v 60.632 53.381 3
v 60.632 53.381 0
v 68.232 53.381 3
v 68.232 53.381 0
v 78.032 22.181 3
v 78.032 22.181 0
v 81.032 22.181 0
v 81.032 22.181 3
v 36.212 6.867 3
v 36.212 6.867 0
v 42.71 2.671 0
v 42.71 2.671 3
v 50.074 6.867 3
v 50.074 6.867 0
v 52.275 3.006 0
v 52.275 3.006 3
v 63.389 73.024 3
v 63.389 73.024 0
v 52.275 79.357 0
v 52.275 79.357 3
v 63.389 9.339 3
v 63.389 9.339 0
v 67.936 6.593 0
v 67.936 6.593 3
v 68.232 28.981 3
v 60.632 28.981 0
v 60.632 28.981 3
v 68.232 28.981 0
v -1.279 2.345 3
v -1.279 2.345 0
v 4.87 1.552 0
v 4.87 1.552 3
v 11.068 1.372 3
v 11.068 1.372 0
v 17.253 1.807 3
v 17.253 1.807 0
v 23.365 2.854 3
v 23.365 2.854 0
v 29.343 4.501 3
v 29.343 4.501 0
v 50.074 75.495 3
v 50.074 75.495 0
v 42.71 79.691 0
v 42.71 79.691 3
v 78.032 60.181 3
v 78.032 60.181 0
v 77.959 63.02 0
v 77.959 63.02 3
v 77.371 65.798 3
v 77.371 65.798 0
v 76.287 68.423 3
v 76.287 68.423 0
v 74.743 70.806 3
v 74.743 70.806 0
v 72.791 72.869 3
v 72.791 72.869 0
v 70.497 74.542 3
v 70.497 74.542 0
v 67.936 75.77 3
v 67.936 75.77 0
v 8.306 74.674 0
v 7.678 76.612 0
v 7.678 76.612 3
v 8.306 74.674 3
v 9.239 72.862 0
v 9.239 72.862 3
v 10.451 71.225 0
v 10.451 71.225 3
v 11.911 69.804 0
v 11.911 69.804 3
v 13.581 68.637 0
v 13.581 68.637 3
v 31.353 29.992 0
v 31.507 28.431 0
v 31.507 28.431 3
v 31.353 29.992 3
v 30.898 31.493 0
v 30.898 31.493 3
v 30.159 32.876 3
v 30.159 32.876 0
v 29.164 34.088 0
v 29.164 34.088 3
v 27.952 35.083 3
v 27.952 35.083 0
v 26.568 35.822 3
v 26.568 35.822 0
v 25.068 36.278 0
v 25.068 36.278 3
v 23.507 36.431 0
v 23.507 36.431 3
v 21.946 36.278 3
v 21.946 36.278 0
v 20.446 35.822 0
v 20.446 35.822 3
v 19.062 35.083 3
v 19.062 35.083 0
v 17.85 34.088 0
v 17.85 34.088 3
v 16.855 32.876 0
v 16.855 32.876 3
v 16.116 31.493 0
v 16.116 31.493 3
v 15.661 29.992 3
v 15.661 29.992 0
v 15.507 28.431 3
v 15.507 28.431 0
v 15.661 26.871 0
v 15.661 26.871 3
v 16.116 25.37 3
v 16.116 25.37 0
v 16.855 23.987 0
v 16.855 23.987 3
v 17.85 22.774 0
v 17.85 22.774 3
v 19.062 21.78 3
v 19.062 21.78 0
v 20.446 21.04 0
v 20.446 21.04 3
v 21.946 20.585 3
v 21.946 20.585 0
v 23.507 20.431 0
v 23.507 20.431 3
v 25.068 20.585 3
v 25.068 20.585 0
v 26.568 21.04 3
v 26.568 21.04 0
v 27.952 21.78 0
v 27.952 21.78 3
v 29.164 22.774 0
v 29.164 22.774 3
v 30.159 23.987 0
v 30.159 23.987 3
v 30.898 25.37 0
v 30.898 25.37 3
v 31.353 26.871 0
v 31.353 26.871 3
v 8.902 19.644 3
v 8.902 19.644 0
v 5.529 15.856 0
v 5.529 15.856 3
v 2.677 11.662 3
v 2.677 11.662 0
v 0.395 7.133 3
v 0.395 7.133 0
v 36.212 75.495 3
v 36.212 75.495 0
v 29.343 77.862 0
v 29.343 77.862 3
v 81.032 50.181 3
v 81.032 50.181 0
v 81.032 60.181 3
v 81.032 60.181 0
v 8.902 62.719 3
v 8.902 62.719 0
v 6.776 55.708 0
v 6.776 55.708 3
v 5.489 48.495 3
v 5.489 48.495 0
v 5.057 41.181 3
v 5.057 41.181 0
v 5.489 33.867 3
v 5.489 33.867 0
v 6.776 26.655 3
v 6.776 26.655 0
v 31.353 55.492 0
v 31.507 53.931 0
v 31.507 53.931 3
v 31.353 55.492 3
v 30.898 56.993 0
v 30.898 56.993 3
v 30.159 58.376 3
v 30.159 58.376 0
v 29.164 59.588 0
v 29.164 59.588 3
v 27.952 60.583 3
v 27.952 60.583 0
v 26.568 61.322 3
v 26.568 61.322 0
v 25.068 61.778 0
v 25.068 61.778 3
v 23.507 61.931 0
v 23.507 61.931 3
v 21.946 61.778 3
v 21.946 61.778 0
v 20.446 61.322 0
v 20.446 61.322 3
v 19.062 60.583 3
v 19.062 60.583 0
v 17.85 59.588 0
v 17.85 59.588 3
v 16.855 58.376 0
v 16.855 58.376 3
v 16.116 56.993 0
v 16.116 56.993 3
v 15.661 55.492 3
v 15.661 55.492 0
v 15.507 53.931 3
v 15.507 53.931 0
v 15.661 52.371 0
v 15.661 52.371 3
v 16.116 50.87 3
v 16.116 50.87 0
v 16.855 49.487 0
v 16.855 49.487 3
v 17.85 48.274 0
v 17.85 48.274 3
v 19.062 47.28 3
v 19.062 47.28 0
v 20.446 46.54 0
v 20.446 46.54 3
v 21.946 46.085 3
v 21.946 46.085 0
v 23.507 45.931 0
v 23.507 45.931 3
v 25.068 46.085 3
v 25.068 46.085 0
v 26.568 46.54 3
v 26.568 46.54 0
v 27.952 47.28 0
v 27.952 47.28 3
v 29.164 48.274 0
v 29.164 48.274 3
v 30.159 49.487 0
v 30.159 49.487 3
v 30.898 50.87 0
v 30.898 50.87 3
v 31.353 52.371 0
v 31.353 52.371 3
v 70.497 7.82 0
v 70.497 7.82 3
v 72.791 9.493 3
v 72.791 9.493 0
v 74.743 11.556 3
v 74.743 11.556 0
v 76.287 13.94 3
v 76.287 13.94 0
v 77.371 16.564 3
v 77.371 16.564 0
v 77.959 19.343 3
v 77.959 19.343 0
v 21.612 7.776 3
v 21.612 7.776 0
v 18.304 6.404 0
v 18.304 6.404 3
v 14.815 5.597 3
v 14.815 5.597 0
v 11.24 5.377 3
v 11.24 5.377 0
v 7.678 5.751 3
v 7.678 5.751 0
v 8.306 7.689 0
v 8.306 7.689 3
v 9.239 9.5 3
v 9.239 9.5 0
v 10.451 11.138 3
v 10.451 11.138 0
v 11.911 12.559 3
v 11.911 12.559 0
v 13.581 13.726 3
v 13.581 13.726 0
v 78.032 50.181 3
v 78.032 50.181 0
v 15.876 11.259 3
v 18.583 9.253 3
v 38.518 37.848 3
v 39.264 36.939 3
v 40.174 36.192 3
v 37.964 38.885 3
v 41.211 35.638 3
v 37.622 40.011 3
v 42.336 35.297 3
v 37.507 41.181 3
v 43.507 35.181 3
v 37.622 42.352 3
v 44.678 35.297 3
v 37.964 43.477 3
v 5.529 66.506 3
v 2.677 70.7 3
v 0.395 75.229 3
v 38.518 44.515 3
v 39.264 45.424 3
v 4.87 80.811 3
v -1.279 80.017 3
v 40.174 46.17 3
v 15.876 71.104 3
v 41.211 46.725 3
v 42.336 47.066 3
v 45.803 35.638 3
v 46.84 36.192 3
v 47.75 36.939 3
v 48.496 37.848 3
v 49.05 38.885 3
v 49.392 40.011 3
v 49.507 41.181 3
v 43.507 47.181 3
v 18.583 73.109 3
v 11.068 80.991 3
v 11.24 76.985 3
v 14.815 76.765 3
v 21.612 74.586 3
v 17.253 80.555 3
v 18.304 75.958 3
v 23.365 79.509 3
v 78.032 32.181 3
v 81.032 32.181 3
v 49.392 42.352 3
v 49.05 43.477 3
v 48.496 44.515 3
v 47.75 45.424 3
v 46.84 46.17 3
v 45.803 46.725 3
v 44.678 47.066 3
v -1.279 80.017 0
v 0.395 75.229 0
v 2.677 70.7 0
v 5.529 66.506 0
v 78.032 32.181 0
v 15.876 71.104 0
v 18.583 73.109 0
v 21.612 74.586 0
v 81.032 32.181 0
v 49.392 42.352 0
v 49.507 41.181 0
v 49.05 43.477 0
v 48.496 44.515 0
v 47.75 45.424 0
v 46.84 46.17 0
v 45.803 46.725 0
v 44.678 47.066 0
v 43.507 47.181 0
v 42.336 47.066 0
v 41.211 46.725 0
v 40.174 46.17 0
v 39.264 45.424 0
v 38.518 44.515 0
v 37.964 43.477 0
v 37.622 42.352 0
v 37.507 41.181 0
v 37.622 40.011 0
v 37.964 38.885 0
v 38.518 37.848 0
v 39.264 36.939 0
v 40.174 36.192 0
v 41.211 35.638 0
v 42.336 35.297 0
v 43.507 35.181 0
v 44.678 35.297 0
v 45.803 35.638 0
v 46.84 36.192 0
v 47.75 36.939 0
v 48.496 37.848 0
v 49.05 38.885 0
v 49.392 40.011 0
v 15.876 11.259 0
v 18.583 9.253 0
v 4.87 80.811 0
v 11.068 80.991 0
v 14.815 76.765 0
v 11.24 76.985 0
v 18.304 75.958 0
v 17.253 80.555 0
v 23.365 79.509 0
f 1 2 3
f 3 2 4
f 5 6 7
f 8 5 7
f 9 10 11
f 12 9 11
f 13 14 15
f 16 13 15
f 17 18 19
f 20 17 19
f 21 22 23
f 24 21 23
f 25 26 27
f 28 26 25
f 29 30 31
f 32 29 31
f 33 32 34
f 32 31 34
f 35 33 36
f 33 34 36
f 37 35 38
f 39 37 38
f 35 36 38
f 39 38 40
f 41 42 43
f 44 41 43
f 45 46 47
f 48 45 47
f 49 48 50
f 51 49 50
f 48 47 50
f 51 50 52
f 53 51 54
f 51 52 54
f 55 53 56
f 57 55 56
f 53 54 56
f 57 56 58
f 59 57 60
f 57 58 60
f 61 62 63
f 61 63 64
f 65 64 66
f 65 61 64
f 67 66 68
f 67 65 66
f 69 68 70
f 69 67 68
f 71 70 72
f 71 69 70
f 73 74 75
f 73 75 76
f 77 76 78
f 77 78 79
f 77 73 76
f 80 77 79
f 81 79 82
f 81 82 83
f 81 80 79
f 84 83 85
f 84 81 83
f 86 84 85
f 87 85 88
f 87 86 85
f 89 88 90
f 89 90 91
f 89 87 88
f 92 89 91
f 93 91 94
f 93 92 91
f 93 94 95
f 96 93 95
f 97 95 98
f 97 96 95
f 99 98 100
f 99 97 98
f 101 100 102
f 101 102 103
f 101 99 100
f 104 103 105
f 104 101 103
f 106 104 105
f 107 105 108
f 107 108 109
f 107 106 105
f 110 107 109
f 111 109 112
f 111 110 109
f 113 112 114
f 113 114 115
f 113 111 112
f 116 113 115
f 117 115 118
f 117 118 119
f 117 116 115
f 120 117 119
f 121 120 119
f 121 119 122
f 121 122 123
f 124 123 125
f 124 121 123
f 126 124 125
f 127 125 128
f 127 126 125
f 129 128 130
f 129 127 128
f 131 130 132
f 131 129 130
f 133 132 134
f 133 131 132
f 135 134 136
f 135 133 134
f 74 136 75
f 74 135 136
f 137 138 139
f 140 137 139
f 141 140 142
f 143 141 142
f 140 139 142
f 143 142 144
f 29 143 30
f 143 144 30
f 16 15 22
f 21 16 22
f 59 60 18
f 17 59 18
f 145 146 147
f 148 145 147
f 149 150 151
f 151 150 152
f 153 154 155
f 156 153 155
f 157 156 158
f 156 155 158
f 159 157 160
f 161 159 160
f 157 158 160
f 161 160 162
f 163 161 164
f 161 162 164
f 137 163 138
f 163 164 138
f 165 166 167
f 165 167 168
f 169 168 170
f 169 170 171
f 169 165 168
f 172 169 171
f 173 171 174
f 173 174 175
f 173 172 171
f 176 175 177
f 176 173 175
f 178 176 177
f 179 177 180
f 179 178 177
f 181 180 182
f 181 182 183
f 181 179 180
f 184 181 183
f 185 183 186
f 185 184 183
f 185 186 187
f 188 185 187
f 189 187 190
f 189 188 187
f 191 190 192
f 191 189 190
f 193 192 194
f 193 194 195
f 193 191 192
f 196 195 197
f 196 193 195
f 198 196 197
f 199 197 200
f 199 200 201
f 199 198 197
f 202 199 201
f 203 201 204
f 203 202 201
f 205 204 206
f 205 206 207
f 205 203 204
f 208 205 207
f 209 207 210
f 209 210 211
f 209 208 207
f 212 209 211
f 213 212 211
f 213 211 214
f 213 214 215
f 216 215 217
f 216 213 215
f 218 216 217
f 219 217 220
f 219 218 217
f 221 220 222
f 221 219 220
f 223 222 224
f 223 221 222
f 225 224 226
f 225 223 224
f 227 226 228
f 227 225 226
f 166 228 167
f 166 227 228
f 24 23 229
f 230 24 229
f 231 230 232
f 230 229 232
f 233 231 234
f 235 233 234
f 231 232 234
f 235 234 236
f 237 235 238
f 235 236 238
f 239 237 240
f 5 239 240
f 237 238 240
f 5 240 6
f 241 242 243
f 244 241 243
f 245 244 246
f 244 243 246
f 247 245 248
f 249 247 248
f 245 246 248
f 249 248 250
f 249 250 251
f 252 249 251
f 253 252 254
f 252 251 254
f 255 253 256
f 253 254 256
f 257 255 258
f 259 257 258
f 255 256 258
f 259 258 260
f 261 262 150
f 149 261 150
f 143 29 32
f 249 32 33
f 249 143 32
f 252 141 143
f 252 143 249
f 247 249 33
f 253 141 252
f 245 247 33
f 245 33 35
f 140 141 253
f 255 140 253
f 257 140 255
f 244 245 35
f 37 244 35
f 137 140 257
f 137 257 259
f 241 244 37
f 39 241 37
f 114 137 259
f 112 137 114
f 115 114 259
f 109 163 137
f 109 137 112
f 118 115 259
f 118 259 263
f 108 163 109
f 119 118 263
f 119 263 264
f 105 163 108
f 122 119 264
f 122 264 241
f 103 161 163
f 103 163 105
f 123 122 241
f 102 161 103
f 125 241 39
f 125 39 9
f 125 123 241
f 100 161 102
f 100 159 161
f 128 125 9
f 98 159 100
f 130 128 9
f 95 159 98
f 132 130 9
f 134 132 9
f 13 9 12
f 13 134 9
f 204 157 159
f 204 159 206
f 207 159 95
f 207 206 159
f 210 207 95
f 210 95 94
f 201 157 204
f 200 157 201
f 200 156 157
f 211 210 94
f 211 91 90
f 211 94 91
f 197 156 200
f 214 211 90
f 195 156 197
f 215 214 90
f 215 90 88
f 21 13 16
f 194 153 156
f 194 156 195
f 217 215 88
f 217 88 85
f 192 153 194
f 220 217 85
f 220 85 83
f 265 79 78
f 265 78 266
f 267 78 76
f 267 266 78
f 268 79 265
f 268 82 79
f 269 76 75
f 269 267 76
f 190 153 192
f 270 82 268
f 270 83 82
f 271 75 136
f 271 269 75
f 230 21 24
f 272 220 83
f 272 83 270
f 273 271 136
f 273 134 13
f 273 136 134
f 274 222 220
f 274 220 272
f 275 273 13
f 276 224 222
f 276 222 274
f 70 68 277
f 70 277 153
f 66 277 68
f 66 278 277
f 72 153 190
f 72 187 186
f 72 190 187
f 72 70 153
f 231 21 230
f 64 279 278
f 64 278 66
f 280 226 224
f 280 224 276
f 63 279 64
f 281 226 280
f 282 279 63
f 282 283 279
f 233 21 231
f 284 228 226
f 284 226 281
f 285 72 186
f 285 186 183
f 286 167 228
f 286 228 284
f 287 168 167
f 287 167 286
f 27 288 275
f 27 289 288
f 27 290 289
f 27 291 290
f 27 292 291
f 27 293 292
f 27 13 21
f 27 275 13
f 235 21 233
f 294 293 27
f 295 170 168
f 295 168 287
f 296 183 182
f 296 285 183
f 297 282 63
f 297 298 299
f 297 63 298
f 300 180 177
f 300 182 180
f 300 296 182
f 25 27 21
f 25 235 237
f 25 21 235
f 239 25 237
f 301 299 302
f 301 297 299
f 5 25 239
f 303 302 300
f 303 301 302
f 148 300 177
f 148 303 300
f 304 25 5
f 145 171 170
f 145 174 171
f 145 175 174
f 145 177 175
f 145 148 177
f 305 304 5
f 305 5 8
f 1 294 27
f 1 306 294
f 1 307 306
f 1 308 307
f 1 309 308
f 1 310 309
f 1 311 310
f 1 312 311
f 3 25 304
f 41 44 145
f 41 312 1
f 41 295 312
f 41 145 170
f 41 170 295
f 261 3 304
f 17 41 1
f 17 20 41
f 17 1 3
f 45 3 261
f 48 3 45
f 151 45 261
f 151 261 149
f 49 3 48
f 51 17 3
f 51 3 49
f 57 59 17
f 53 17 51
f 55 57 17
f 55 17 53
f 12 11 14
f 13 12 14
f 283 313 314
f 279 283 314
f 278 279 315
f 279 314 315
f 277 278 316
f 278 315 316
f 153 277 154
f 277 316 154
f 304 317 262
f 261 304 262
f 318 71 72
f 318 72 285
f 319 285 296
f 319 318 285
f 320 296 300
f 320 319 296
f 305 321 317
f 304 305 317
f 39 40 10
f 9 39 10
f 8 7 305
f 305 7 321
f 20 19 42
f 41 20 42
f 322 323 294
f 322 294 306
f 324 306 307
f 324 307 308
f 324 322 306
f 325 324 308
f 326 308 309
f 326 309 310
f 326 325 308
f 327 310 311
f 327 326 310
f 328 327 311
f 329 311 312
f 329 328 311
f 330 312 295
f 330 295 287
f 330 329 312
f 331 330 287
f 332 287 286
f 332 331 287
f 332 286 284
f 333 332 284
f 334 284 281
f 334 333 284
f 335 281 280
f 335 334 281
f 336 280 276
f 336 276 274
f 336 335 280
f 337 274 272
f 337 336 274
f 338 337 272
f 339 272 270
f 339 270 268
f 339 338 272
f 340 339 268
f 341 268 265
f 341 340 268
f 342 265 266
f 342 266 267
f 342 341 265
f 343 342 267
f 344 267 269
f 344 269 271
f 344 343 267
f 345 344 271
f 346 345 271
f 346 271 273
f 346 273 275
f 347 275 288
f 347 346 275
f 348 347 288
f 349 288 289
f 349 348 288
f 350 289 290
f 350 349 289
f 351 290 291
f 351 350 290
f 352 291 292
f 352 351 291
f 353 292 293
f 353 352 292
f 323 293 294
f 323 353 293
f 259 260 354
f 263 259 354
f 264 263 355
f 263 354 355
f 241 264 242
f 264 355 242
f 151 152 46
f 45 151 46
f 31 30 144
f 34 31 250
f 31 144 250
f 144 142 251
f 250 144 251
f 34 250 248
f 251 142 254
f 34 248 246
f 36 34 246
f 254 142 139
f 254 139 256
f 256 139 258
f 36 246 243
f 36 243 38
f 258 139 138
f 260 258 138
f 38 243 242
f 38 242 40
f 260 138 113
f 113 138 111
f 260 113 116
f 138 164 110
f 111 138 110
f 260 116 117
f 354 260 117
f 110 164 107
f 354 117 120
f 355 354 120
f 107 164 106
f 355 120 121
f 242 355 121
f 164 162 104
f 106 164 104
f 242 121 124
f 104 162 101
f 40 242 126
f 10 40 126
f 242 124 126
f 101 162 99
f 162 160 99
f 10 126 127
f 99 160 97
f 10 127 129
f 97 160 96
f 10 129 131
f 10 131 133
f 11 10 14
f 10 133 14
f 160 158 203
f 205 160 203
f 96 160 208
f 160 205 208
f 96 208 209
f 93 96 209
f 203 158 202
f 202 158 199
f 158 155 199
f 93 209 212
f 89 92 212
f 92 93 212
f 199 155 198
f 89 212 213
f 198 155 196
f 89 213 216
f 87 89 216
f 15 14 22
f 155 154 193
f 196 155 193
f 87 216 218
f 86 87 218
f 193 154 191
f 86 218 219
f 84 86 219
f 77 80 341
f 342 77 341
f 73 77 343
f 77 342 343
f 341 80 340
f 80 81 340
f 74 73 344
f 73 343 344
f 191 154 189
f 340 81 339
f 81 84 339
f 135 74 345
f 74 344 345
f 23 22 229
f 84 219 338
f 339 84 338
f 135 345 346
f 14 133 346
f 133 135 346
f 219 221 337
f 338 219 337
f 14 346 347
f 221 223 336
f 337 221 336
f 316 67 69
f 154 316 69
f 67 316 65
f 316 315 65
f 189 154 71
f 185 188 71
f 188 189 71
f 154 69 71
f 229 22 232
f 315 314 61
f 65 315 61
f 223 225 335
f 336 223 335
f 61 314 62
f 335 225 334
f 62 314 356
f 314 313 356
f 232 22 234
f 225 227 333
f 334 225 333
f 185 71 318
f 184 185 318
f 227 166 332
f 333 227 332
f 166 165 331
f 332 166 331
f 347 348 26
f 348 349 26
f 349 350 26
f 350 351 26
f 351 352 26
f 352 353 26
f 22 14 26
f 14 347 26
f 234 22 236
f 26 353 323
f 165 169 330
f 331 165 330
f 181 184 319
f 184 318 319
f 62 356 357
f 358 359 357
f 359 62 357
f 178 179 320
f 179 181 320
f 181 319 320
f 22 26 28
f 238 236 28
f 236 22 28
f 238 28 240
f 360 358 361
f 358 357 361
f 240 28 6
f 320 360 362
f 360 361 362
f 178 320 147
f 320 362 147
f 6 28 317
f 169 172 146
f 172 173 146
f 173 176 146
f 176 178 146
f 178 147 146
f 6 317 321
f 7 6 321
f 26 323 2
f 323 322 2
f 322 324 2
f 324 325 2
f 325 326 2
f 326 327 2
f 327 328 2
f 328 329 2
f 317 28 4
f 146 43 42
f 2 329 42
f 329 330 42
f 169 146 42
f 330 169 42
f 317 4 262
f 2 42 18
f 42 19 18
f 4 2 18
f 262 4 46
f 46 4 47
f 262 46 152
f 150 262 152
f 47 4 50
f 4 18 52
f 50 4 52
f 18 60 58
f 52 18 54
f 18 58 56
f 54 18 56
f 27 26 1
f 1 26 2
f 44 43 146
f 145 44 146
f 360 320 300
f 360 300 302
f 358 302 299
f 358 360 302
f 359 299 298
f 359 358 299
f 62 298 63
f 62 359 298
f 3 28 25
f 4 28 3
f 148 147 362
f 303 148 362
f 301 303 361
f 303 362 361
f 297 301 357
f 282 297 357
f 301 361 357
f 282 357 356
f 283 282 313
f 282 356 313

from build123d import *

# Parameters (mm, degrees)
SKETCH2_R           = 8
SKETCH2_R_2         = 6
SKETCH2_W           = 7.6
SKETCH2_H           = 24.4
BOSS_EXTRUDE1_DEPTH = 3


with BuildPart() as part:
    # Sketch2 → Boss-Extrude1 (new body)
    with BuildSketch(Plane.XY):
        with BuildLine():
            Line((81.032103119, 50.181312), (81.032103119, 60.181312))
            Line((81.032103119, 60.181312), (78.032103119, 60.181312))
            ThreePointArc((78.032103119, 60.181312), (75.569321499, 69.649967364), (67.936161846, 75.770065518))
            Line((67.936161846, 75.770065518), (63.389132962, 73.023833254))
            Line((63.389132962, 73.023833254), (52.27464227, 79.356930255))
            Line((52.27464227, 79.356930255), (50.074247047, 75.495269488))
            Line((50.074247047, 75.495269488), (42.709956252, 79.691482274))
            Line((42.709956252, 79.691482274), (36.212476018, 75.495269488))
            Line((36.212476018, 75.495269488), (29.342622159, 77.861804263))
            ThreePointArc((29.342622159, 77.861804263), (14.166162437, 80.849682425), (-1.279201176, 80.017163065))
            ThreePointArc((-1.279201176, 80.017163065), (2.677054283, 70.700200378), (8.902417187, 62.718809041))
            ThreePointArc((8.902417187, 62.718809041), (5.05730693, 41.181312), (8.902417187, 19.643814959))
            ThreePointArc((8.902417187, 19.643814959), (2.677054283, 11.662423622), (-1.279201176, 2.345460935))
            ThreePointArc((-1.279201176, 2.345460935), (14.166162437, 1.512941575), (29.342622159, 4.500819737))
            Line((29.342622159, 4.500819737), (36.212476018, 6.867354512))
            Line((36.212476018, 6.867354512), (42.709956252, 2.671141726))
            Line((42.709956252, 2.671141726), (50.074247047, 6.867354512))
            Line((50.074247047, 6.867354512), (52.27464227, 3.005693745))
            Line((52.27464227, 3.005693745), (63.389132962, 9.338790746))
            Line((63.389132962, 9.338790746), (67.936161846, 6.592558482))
            ThreePointArc((67.936161846, 6.592558482), (75.569321499, 12.712656636), (78.032103119, 22.181312))
            Line((78.032103119, 22.181312), (81.032103119, 22.181312))
            Line((81.032103119, 22.181312), (81.032103119, 32.181312))
            Line((81.032103119, 32.181312), (78.032103119, 32.181312))
            Line((78.032103119, 32.181312), (78.032103119, 50.181312))
            Line((78.032103119, 50.181312), (81.032103119, 50.181312))
        make_face()
        with Locations((23.507028058, 53.931312)):
            Circle(SKETCH2_R, mode=Mode.SUBTRACT)
        with Locations((43.507028058, 41.181312)):
            Circle(SKETCH2_R_2, mode=Mode.SUBTRACT)
        with Locations((23.507028058, 28.431312)):
            Circle(SKETCH2_R, mode=Mode.SUBTRACT)
        with Locations((64.432028058, 41.181312)):
            Rectangle(SKETCH2_W, SKETCH2_H, mode=Mode.SUBTRACT)
        with BuildLine():
            ThreePointArc((21.611730632, 74.586477389), (14.814545044, 76.765459524), (7.678288301, 76.612049032))
            ThreePointArc((7.678288301, 76.612049032), (9.811410227, 72.018941841), (13.580912618, 68.636975763))
            ThreePointArc((13.580912618, 68.636975763), (17.183726984, 72.168659356), (21.611730632, 74.586477389))
        make_face(mode=Mode.SUBTRACT)
        with BuildLine():
            ThreePointArc((7.678288301, 5.750574968), (9.811410227, 10.343682159), (13.580912618, 13.725648237))
            ThreePointArc((13.580912618, 13.725648237), (17.183726984, 10.193964644), (21.611730632, 7.776146611))
            ThreePointArc((21.611730632, 7.776146611), (14.814545044, 5.597164476), (7.678288301, 5.750574968))
        make_face(mode=Mode.SUBTRACT)
    extrude(amount=BOSS_EXTRUDE1_DEPTH)


solid = part.part
